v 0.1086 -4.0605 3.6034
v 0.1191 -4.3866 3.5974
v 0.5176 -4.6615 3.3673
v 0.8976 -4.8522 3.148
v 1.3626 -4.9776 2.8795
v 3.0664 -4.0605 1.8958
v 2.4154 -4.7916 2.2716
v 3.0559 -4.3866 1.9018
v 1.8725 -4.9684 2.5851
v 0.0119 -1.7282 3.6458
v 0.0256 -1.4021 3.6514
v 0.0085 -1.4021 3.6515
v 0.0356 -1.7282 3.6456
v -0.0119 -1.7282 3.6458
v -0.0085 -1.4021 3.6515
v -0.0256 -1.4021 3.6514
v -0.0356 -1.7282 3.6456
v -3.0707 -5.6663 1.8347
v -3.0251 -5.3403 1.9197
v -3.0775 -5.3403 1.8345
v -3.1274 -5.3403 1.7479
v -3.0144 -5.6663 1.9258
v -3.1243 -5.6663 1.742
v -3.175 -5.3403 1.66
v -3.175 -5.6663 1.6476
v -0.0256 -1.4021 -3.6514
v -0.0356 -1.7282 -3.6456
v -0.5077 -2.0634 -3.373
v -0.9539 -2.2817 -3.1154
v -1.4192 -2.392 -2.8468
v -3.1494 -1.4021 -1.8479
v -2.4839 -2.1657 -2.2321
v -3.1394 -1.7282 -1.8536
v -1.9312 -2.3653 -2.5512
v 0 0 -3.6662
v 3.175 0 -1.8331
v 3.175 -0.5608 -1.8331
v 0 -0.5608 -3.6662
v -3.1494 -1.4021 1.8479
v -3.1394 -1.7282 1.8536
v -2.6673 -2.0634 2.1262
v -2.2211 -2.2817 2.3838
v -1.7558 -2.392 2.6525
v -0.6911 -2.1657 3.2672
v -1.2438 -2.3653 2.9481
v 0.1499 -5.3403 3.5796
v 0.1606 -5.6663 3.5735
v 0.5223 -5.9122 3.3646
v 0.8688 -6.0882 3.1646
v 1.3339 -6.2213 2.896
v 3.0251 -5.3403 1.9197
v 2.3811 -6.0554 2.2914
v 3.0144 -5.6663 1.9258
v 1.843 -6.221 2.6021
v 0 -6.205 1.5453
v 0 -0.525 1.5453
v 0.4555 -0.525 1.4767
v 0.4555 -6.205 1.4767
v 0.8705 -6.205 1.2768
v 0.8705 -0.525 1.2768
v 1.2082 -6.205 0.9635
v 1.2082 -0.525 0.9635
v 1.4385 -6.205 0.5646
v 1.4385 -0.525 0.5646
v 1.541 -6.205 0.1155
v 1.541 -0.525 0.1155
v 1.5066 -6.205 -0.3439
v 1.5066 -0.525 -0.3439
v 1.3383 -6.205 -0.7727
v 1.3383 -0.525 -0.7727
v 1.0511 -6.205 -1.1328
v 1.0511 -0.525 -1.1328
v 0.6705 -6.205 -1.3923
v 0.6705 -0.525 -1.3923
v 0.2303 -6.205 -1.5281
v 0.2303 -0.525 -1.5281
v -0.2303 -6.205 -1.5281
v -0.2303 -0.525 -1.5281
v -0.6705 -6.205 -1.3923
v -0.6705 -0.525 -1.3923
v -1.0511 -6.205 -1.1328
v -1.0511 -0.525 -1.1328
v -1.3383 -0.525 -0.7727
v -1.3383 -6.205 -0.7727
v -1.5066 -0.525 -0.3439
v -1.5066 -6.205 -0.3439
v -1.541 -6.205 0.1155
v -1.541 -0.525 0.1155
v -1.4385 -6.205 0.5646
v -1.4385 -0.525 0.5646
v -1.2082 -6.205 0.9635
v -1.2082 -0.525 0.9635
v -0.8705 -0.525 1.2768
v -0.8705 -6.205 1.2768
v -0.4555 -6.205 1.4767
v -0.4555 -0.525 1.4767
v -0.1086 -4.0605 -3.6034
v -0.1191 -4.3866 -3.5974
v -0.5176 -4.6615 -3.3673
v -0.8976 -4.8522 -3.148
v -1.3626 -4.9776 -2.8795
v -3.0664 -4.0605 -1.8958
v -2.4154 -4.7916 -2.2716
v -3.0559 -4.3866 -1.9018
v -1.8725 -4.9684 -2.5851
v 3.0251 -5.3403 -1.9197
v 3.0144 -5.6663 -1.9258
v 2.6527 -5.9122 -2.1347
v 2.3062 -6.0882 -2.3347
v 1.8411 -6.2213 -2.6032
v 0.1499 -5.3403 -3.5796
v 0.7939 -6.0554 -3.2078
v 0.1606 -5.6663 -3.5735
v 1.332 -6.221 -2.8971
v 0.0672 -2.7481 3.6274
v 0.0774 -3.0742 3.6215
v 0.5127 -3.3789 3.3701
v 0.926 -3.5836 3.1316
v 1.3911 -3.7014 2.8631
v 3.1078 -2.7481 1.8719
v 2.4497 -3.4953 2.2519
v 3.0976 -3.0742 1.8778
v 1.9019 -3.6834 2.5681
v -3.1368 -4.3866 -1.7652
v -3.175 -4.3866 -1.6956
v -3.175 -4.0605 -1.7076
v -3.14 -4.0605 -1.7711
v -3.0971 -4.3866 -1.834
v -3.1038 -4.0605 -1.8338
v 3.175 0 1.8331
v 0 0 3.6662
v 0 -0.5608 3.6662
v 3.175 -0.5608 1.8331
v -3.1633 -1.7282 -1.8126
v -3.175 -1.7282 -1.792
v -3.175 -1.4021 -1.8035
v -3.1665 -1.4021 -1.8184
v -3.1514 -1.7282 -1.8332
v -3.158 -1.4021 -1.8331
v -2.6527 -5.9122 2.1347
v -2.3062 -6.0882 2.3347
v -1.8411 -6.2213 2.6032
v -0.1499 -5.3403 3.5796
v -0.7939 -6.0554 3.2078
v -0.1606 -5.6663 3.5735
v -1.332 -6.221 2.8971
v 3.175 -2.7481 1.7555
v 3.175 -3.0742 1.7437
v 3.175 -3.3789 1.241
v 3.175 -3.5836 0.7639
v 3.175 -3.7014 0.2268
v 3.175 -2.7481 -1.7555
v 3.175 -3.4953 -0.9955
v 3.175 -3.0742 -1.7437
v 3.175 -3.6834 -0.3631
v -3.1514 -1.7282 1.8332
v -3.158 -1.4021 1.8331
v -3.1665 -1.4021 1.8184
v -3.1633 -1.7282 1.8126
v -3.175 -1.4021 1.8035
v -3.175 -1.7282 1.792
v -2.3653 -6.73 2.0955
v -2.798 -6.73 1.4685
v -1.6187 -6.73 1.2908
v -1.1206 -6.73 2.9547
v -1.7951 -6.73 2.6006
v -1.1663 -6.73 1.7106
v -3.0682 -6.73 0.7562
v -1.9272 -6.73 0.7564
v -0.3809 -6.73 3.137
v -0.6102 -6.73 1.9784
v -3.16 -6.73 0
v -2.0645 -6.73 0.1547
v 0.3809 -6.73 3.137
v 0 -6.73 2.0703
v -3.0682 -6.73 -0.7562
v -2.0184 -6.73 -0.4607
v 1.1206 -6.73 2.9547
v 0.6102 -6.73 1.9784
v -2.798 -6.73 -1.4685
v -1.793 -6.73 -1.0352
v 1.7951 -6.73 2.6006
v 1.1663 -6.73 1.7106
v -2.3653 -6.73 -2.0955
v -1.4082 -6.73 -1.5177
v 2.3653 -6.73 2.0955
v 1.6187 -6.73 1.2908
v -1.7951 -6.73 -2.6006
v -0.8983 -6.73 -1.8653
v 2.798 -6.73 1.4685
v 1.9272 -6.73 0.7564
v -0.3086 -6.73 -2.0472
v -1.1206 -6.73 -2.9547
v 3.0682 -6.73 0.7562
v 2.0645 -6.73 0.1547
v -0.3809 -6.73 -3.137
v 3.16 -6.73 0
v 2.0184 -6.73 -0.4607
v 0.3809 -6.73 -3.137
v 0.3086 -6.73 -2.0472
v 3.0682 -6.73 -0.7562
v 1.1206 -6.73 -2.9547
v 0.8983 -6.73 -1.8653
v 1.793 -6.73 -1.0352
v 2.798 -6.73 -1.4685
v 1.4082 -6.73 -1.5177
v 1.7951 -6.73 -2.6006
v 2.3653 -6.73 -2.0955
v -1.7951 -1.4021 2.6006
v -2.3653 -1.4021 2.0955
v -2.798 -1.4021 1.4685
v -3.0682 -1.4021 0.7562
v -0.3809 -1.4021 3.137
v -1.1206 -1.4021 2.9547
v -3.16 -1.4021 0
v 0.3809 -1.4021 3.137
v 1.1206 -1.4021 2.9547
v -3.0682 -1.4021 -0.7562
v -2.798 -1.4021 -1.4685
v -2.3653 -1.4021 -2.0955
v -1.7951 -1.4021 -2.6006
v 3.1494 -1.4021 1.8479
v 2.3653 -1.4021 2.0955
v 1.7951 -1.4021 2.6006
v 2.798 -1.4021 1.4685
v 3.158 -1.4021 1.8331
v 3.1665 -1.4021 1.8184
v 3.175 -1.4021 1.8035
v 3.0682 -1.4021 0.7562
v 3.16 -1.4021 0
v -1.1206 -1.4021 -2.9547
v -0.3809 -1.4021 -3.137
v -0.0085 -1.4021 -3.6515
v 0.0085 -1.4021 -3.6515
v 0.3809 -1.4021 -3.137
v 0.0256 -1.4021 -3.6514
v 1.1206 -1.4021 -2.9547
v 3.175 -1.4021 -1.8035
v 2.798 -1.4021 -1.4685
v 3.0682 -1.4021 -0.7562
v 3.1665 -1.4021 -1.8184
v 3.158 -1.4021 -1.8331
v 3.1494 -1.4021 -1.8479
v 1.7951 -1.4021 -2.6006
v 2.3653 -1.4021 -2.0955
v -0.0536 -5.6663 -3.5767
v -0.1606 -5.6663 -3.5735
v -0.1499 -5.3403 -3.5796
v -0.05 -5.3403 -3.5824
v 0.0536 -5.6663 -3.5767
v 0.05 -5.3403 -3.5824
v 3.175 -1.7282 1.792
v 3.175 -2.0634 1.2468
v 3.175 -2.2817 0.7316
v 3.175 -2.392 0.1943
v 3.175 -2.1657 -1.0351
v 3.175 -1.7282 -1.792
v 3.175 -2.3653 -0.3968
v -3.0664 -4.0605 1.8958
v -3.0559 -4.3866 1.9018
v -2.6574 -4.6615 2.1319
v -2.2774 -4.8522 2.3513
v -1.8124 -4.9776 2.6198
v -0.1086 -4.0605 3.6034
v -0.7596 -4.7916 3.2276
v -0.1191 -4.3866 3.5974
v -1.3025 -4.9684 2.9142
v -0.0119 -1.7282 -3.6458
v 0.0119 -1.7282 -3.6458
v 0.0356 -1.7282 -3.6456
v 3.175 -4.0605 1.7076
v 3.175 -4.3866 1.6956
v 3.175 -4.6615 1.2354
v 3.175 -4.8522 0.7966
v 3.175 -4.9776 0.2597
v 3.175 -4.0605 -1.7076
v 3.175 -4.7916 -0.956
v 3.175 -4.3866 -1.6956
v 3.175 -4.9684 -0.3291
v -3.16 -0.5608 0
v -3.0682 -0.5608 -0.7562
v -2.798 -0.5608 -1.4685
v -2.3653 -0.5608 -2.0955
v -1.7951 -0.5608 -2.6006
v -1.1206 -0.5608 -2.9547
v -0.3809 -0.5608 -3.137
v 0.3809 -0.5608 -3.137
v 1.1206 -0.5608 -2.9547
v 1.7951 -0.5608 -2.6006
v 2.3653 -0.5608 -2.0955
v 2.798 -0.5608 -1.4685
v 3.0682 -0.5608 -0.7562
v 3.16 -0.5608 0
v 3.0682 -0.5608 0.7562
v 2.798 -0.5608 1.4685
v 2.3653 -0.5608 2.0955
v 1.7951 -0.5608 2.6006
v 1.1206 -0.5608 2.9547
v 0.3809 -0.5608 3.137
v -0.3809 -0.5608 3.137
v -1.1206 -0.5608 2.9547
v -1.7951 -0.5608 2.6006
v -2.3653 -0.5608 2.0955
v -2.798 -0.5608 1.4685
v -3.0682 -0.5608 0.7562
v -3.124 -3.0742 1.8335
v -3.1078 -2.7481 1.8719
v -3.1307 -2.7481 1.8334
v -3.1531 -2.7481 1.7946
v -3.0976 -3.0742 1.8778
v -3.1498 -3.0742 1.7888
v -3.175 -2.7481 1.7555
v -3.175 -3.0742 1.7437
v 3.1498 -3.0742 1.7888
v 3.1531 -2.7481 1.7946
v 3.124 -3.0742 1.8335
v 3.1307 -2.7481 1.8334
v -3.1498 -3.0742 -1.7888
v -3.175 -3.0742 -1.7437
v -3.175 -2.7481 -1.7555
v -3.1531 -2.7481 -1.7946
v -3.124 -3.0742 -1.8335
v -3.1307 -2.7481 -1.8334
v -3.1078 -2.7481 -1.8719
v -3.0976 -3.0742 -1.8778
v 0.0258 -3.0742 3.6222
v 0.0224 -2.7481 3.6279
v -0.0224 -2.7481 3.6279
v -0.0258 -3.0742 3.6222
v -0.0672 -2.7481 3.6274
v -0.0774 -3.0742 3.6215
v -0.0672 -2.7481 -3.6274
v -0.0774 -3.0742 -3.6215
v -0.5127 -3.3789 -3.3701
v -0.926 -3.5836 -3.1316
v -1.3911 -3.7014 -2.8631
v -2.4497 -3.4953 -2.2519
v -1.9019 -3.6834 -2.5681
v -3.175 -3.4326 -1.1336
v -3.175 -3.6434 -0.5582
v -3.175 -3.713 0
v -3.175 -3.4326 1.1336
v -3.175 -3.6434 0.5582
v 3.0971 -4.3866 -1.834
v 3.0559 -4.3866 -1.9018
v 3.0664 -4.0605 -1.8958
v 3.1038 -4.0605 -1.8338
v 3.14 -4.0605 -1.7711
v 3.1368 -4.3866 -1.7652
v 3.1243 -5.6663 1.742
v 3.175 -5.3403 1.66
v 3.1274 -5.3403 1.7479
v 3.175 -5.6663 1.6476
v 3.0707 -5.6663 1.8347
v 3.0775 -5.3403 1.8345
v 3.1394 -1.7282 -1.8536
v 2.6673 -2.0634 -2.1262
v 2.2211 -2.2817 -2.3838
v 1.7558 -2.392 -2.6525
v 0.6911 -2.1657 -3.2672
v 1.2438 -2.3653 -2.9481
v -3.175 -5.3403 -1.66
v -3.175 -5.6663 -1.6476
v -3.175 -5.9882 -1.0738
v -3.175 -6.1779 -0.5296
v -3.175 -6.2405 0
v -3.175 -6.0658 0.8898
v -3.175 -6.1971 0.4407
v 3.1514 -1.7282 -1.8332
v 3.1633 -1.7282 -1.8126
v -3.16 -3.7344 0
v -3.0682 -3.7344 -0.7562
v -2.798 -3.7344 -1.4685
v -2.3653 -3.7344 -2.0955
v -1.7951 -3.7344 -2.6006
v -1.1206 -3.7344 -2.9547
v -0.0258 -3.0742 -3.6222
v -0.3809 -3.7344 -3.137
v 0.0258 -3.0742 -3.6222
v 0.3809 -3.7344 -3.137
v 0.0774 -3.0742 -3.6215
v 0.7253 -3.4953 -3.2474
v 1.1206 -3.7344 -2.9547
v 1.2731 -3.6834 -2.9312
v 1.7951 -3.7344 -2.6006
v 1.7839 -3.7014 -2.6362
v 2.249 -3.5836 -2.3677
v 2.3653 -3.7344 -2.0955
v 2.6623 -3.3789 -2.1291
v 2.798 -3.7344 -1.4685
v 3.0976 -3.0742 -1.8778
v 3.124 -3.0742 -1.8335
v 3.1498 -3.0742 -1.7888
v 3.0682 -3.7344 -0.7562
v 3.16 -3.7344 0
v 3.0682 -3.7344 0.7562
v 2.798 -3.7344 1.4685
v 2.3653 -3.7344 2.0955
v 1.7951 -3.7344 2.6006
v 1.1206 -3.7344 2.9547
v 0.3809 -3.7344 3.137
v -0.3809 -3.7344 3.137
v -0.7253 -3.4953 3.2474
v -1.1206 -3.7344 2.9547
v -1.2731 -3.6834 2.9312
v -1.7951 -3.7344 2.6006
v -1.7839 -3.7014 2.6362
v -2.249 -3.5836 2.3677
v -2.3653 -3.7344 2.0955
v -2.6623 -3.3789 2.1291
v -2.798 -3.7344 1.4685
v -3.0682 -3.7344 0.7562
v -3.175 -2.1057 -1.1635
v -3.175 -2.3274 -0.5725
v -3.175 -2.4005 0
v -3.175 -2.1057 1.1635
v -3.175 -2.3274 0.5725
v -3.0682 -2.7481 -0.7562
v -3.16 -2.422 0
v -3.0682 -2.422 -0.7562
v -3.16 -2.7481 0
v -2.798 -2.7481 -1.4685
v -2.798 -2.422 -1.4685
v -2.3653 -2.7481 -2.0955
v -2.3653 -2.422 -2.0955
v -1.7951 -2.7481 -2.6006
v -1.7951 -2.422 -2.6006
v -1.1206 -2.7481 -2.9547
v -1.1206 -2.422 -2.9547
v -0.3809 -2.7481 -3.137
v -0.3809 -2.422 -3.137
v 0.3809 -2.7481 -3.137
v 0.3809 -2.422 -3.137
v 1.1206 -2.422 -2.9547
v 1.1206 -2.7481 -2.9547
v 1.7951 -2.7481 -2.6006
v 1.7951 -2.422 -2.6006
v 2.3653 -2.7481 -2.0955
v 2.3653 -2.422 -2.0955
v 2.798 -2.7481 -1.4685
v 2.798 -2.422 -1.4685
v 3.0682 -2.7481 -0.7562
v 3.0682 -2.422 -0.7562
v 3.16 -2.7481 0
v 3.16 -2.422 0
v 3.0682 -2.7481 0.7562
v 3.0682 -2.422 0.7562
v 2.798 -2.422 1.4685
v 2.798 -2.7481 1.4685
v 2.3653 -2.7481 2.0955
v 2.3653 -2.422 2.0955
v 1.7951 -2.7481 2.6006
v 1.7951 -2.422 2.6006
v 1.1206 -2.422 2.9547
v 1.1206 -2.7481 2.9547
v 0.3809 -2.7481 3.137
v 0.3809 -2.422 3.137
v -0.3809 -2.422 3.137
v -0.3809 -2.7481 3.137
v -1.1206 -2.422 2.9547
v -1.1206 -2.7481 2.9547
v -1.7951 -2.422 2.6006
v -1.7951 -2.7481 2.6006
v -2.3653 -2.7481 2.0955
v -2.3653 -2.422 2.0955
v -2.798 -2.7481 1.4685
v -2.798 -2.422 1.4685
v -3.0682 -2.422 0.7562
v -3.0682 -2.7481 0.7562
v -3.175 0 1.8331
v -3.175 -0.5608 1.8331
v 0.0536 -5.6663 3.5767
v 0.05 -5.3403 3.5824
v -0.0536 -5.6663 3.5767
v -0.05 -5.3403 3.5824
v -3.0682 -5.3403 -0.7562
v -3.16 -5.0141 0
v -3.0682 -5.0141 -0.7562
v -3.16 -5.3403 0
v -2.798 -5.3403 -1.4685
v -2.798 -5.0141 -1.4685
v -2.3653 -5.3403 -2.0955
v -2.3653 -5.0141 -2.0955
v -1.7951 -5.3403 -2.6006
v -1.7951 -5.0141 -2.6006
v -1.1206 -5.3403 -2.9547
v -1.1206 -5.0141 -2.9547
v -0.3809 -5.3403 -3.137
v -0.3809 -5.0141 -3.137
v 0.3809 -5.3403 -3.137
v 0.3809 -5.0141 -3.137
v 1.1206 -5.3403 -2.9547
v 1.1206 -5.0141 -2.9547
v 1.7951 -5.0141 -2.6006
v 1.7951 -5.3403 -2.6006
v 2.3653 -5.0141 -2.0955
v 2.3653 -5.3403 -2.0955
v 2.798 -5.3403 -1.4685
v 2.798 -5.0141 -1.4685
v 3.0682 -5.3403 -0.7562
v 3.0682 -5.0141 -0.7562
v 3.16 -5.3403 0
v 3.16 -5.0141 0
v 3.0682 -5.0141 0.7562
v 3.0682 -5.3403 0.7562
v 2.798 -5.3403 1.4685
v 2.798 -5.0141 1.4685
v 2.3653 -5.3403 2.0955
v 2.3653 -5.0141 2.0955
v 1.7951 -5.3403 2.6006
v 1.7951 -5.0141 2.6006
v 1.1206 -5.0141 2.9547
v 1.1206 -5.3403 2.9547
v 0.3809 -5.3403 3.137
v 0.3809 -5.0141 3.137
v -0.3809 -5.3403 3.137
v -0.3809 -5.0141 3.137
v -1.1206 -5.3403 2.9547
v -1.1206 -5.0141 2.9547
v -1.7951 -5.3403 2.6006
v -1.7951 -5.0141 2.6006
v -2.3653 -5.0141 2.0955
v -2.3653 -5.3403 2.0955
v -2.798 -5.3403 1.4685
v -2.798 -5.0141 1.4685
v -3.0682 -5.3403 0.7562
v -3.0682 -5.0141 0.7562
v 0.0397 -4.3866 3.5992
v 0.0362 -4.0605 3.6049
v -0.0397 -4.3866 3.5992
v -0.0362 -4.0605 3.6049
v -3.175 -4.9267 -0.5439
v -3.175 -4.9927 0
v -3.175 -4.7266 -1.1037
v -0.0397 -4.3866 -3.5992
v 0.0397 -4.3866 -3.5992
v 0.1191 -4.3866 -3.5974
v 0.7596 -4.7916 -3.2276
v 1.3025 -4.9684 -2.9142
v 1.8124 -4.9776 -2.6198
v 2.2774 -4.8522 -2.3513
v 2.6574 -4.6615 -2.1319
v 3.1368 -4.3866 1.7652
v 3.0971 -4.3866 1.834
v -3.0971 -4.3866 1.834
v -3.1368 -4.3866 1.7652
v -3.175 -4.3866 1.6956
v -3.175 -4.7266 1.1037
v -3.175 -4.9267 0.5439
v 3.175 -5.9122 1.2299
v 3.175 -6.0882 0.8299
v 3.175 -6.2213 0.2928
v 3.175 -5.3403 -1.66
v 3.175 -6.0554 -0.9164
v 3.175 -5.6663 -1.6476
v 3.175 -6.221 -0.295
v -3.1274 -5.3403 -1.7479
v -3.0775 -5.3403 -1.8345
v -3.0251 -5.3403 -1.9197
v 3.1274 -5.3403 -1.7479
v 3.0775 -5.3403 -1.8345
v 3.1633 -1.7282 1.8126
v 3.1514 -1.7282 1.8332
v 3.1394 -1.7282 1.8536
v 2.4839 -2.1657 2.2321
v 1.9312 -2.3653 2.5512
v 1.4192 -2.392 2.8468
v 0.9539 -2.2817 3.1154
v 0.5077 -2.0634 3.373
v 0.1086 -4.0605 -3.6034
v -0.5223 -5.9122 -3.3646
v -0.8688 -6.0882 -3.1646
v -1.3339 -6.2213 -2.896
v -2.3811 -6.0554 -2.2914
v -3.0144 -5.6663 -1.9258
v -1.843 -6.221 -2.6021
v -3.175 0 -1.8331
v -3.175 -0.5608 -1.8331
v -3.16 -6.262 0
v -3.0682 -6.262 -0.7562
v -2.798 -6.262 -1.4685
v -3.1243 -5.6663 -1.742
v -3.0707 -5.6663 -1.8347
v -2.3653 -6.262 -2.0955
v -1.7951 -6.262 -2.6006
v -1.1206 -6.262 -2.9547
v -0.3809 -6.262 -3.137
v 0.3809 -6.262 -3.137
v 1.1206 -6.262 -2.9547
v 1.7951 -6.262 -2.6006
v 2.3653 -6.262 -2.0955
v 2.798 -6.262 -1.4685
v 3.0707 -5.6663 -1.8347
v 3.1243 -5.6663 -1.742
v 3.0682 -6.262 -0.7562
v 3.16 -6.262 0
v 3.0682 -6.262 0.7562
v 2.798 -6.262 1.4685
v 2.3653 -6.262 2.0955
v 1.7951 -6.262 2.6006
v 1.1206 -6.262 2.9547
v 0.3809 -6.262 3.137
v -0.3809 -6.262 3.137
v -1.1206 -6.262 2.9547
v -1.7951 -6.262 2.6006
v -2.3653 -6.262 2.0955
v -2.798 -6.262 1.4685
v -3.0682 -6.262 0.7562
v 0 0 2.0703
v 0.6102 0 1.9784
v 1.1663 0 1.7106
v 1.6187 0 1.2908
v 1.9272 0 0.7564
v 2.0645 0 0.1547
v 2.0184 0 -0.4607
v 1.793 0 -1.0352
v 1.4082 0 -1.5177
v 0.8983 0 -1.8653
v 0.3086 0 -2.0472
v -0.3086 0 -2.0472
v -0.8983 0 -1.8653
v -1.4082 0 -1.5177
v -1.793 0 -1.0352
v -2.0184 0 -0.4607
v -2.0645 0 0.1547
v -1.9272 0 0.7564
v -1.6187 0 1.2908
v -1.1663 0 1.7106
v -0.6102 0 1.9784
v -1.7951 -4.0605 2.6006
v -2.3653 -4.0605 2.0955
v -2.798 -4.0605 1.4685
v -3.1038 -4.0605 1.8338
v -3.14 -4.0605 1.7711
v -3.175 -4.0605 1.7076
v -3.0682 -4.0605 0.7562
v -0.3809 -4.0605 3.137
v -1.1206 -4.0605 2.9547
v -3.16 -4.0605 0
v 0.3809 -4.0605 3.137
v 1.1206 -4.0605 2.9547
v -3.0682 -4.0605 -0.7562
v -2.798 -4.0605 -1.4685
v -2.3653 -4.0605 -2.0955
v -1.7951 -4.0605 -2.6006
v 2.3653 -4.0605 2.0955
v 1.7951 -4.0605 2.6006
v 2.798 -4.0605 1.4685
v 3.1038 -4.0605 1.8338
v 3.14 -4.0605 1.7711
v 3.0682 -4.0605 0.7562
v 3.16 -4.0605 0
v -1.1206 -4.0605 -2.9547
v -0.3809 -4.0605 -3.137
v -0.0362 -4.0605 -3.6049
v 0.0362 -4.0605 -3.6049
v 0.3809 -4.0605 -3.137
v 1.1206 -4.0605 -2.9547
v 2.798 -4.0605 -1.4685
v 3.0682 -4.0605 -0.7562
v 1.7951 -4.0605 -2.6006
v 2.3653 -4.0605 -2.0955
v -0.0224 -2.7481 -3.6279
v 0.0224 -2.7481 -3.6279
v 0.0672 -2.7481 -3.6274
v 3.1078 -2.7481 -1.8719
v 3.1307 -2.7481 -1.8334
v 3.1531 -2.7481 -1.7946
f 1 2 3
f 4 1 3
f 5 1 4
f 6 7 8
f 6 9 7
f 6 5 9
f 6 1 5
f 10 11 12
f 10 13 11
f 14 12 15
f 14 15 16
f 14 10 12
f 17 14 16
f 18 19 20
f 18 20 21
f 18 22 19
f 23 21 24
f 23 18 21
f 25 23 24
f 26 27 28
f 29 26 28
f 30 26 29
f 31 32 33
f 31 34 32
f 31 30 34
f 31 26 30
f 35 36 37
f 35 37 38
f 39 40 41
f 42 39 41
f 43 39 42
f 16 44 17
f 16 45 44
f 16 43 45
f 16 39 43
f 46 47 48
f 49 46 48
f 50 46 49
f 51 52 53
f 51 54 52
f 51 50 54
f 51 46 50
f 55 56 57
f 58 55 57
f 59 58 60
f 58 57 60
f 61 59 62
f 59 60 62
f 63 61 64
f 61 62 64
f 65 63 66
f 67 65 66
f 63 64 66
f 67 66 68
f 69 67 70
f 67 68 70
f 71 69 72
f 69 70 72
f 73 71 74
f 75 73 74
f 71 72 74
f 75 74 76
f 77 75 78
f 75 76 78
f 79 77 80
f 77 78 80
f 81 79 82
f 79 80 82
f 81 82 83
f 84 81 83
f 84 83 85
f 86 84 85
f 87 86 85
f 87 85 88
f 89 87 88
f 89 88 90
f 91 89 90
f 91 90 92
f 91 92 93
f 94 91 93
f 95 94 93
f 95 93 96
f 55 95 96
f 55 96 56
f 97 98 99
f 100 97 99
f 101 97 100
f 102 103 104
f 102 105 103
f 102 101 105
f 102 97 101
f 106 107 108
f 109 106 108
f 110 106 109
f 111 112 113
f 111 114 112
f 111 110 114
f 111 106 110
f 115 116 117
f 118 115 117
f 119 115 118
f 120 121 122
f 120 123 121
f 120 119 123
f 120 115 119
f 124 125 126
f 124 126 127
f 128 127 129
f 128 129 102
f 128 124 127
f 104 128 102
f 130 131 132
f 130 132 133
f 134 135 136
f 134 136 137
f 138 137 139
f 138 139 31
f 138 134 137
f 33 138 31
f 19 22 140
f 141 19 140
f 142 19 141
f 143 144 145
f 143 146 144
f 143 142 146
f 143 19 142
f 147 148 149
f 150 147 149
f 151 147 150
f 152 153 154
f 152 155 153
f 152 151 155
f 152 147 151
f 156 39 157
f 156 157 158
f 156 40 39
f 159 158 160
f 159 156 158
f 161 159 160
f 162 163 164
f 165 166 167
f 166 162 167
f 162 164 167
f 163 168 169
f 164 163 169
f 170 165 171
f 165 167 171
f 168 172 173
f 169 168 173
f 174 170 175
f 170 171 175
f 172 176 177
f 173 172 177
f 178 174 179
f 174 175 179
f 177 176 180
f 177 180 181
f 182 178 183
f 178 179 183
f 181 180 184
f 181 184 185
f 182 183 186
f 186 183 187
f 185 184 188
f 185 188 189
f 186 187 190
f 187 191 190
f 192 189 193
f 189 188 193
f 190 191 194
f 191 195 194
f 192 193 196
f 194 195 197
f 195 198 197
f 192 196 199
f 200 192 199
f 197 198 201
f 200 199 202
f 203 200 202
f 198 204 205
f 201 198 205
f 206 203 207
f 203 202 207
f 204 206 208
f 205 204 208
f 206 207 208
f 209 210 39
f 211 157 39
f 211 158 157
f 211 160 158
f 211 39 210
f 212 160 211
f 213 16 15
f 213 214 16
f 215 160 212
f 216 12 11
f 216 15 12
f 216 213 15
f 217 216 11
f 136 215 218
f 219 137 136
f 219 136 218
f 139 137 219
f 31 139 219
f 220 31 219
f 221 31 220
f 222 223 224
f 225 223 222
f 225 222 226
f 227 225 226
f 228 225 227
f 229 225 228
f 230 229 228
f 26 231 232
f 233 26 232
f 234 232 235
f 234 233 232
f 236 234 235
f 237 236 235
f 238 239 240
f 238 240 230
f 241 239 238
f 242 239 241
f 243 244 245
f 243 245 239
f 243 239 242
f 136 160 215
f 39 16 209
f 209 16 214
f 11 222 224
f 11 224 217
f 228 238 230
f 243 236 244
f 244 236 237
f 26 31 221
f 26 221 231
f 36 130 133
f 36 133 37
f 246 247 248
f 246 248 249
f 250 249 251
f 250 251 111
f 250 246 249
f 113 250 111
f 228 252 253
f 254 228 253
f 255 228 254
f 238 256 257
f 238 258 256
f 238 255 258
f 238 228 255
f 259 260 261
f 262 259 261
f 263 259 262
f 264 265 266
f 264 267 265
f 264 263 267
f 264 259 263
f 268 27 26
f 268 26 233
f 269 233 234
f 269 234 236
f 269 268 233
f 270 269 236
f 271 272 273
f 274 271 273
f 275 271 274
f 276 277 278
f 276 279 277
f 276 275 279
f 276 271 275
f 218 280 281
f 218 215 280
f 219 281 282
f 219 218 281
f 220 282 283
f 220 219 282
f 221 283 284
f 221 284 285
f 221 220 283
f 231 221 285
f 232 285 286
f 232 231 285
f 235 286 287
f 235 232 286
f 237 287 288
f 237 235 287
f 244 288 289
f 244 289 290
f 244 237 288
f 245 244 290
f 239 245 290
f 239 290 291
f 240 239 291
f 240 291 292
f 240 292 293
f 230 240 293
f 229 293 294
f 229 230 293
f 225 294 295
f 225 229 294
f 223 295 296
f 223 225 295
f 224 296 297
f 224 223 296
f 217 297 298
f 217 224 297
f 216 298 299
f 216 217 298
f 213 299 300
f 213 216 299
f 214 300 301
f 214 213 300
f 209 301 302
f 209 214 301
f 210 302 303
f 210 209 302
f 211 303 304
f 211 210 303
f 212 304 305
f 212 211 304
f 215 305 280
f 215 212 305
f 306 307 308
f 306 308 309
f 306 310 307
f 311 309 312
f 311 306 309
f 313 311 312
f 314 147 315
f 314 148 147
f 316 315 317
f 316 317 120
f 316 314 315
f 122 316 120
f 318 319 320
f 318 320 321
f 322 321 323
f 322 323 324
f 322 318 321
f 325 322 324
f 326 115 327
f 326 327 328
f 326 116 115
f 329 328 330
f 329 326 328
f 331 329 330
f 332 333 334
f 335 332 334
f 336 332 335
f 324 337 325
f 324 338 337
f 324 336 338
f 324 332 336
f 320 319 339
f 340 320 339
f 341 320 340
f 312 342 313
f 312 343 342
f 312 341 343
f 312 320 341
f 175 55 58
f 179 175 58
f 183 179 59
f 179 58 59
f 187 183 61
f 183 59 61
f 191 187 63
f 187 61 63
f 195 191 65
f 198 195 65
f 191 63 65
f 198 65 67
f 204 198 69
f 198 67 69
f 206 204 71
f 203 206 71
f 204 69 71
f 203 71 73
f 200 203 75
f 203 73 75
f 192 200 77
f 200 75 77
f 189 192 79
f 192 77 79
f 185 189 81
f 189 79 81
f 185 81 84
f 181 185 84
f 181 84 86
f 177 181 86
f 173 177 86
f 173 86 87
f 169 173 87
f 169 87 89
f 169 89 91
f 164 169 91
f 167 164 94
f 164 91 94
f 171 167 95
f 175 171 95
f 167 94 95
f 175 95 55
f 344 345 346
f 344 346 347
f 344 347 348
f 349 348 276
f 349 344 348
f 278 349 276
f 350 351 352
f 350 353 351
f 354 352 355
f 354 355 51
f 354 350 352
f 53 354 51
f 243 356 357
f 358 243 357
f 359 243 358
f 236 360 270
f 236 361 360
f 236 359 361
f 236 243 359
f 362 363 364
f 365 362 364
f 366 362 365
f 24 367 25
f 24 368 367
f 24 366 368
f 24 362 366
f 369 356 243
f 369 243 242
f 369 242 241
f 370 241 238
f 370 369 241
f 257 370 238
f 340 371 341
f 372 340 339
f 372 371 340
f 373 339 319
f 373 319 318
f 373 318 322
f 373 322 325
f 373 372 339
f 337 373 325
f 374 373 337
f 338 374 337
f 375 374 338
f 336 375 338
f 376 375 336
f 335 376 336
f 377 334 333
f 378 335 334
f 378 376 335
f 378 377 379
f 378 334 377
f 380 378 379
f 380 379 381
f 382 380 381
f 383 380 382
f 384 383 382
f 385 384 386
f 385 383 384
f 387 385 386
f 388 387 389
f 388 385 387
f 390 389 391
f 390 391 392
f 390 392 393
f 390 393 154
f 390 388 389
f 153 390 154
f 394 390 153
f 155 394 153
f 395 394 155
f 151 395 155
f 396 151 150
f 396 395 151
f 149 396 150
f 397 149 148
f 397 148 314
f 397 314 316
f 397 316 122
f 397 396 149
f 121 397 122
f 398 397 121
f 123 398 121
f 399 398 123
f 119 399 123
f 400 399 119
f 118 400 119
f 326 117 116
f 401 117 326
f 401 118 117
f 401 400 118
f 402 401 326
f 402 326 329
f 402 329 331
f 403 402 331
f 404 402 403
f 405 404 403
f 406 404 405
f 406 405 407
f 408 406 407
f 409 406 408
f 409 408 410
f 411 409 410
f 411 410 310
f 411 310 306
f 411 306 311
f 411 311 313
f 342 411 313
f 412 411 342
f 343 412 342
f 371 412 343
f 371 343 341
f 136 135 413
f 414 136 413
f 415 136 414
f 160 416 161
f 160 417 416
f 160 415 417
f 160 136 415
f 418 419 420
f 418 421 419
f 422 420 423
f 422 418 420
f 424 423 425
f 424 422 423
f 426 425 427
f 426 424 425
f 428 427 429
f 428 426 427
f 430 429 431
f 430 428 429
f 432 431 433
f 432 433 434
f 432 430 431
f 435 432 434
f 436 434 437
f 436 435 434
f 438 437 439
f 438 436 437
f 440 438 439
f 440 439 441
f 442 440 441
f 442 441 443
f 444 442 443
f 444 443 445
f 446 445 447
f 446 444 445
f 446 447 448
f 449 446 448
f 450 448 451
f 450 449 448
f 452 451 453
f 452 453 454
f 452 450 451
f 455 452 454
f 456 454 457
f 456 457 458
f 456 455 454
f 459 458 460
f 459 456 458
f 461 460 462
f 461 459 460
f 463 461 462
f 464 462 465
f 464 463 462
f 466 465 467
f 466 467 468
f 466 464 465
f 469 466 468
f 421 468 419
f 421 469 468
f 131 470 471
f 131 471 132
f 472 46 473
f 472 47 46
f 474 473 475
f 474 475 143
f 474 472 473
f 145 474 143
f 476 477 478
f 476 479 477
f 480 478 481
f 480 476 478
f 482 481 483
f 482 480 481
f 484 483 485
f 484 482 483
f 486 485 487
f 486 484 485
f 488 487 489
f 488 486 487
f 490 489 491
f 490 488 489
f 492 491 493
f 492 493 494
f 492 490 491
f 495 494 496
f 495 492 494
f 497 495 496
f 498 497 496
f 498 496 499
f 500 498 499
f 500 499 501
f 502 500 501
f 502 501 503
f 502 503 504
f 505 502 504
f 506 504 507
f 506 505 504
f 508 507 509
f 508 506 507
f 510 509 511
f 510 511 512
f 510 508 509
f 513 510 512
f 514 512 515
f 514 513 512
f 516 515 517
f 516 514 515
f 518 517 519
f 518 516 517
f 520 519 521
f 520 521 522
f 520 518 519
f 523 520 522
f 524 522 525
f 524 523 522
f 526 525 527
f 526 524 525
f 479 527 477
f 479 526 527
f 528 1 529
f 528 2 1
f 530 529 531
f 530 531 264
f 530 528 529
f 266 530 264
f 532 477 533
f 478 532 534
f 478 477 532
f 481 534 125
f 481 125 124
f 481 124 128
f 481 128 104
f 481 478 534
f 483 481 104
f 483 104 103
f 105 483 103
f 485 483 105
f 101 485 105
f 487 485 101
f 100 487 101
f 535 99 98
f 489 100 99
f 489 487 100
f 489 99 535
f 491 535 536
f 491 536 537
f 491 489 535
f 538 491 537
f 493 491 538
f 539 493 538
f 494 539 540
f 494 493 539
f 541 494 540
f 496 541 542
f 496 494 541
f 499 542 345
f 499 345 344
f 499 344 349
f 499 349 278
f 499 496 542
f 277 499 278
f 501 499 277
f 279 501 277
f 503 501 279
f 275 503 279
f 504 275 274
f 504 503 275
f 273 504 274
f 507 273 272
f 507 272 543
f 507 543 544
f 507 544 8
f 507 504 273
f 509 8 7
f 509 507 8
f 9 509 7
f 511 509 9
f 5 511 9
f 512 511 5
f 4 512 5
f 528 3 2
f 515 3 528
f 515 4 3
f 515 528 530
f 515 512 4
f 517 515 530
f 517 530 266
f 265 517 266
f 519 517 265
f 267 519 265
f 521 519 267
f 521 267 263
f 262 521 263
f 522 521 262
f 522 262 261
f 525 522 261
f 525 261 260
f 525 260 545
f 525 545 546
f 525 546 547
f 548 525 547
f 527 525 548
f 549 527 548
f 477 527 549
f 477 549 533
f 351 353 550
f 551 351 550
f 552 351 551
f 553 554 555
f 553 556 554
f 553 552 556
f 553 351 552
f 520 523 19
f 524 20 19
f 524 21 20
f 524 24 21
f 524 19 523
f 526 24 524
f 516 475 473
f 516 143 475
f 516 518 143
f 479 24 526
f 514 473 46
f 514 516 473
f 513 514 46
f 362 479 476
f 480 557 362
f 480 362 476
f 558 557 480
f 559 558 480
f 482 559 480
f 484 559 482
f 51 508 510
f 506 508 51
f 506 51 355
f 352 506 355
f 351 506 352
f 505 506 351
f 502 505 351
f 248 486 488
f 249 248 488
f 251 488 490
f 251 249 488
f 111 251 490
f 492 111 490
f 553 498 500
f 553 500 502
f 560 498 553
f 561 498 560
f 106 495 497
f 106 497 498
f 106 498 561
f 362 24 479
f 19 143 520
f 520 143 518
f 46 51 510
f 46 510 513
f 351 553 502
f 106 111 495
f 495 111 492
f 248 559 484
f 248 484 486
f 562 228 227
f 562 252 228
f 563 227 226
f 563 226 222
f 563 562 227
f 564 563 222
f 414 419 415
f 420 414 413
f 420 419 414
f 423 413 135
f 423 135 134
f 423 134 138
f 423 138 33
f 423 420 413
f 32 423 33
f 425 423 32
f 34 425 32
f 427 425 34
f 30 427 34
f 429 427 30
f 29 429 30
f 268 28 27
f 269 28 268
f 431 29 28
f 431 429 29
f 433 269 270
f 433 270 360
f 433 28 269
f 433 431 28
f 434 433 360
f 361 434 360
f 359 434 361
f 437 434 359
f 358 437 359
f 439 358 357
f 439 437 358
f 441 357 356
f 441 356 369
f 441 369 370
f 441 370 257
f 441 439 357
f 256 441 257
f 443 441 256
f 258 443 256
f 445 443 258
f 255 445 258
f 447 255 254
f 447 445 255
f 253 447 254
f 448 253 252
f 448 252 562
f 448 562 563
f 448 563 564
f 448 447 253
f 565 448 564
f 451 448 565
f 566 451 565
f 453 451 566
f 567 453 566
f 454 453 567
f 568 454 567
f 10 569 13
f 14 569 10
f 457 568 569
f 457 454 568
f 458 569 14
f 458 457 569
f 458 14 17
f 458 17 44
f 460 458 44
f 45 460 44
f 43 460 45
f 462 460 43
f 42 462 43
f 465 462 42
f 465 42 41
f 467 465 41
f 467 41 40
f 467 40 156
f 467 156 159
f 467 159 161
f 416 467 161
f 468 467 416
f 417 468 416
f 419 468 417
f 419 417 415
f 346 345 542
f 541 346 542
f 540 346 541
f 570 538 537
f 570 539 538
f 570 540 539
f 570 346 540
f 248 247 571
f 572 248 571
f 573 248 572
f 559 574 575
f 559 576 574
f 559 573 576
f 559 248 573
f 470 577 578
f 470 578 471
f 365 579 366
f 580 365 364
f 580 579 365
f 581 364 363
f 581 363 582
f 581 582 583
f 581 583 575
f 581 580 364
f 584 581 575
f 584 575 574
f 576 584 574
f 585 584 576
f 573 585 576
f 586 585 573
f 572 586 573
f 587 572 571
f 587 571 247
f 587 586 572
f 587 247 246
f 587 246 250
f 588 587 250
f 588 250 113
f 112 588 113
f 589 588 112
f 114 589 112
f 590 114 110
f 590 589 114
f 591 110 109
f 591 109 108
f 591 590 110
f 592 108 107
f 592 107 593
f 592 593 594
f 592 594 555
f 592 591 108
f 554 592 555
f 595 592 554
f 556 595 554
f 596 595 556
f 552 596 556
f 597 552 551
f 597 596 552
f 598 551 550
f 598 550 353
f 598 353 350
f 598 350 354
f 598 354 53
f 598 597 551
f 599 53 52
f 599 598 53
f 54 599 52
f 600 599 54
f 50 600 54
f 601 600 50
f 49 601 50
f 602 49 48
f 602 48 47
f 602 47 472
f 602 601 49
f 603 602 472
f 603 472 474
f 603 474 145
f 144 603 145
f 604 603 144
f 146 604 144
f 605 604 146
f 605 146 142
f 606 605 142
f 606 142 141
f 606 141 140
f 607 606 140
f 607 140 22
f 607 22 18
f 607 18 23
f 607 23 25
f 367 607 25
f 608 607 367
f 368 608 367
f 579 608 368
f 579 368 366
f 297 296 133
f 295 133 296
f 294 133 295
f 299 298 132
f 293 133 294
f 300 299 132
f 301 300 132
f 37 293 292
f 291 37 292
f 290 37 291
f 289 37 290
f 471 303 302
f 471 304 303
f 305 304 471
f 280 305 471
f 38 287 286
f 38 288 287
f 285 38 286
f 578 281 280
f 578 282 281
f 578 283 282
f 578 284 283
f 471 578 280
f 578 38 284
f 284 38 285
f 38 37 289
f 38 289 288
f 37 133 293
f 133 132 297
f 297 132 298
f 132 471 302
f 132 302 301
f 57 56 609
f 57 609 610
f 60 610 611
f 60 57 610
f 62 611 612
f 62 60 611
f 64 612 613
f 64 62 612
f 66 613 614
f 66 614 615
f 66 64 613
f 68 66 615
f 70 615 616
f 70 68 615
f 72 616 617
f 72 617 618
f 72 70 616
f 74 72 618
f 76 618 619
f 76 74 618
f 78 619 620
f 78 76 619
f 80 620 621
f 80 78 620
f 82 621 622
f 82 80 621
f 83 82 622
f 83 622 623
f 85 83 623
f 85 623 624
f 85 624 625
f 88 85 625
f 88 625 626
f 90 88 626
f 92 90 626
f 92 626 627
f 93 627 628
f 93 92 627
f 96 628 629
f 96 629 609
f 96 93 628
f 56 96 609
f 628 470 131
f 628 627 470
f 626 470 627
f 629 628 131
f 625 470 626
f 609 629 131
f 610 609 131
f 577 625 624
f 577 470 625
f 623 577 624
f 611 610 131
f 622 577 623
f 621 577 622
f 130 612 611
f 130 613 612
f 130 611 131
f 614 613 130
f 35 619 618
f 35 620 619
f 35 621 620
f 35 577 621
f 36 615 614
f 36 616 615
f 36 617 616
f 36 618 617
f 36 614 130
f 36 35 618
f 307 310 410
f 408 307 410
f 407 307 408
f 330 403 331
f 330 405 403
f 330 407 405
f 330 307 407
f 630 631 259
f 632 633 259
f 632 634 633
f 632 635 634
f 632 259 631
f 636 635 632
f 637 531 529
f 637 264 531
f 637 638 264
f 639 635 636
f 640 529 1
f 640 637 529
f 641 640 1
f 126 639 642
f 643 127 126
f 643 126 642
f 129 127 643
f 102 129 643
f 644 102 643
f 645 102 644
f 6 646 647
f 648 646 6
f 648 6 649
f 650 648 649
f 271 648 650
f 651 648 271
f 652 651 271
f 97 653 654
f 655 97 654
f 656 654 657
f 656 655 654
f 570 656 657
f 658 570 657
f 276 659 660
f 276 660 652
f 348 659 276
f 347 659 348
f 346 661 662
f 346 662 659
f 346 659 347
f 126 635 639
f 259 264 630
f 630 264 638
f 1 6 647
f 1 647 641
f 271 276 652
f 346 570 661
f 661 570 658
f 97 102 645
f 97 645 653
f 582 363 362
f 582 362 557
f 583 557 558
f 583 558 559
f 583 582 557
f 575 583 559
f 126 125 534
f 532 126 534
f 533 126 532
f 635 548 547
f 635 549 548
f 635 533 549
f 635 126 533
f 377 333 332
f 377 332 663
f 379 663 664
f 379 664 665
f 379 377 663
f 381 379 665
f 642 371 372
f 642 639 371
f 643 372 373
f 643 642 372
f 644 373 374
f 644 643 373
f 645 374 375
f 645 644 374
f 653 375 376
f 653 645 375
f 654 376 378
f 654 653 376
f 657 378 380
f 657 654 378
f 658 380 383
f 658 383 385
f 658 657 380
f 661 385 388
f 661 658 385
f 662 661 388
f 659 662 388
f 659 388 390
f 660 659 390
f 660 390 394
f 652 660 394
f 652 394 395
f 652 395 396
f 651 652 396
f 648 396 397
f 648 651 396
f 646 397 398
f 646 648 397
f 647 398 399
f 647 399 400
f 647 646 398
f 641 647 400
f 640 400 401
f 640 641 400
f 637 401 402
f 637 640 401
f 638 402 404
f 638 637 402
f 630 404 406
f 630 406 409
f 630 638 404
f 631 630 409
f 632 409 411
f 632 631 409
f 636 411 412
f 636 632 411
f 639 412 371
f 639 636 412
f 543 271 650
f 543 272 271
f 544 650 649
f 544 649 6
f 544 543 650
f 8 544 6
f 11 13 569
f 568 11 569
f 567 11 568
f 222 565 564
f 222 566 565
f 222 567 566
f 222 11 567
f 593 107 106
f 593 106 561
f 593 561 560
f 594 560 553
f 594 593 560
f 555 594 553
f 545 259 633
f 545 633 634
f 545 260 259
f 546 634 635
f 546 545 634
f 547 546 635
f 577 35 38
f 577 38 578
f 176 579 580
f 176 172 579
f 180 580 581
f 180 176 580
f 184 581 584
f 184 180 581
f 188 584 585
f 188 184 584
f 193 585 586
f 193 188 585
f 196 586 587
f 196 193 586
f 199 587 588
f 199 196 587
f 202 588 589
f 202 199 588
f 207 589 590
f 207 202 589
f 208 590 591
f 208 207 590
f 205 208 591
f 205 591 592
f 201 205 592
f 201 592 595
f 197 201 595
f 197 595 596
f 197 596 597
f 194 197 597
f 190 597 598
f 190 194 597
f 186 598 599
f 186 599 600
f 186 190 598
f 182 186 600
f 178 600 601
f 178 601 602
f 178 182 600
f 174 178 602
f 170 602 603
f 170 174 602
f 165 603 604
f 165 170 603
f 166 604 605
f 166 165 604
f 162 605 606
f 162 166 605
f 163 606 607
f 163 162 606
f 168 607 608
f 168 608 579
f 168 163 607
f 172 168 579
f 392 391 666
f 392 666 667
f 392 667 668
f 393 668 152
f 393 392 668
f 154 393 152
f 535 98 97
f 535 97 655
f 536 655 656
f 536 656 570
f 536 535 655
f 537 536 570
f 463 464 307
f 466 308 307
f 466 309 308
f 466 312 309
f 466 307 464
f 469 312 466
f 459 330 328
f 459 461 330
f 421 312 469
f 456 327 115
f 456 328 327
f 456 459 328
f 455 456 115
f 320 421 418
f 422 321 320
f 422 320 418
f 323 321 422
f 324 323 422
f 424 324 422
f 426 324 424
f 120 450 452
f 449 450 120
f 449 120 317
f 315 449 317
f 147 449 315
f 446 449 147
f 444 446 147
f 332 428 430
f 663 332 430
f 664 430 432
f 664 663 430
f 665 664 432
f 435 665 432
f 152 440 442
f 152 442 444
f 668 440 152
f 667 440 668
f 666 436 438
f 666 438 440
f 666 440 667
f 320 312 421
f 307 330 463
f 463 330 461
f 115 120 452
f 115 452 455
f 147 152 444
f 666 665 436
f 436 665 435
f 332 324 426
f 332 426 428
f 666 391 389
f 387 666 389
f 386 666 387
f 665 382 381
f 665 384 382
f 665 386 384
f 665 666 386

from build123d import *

# Parameters (mm, degrees)
EXTRUDE1_DEPTH = 6.73
SKETCH4_R      = 1.545336663
EXTRUDE2_DEPTH = 9.295442022
CHAMFER1_SIZE  = 0.525


with BuildPart() as part:
    # Sketch1 → Extrude1 (new body)
    with BuildSketch(Plane(origin=(0, 0, 0), x_dir=(1, 0, 0), z_dir=(0, 1, 0))):
        Polygon((0, 3.666174209), (-3.175, 1.833087105), (-3.175, -1.833087105), (0, -3.666174209), (3.175, -1.833087105), (3.175, 1.833087105), align=None)
    extrude(amount=-EXTRUDE1_DEPTH)

    # Sketch4 → Extrude2 (cut, through all)
    with BuildSketch(Plane(origin=(0, 0, 0), x_dir=(-1, 0, 0), z_dir=(0, 1, 0))):
        Circle(SKETCH4_R)
    extrude(amount=-EXTRUDE2_DEPTH, mode=Mode.SUBTRACT)

    # Chamfer1
    chamfer1_edges = [part.edges().sort_by_distance(p)[0] for p in [
        (1.545336663, 0, 0),
        (1.545336663, -6.73, 0),
    ]]
    chamfer(chamfer1_edges, length=CHAMFER1_SIZE)

    # Sketch5 → Cut-Revolve1 (revolve, cut)
    with BuildSketch(Plane.XY):
        Polygon((-3.16, -6.73), (-3.666174209, -6.73), (-4.172348419, -6.73), (-4.172348419, 0), (-3.666174209, 0), (-3.666174209, -0.560833333), (-3.16, -0.560833333), (-3.16, -1.402083333), (-3.651490136, -1.402083333), (-3.645798403, -1.728162487), (-3.16, -2.421954508), (-3.16, -2.748083333), (-3.627995619, -2.748083333), (-3.622303886, -3.074162487), (-3.16, -3.73440086), (-3.16, -4.060529685), (-3.605086782, -4.060529685), (-3.59939505, -4.386608839), (-3.16, -5.014130003), (-3.16, -5.340258828), (-3.582749027, -5.340258828), (-3.577057294, -5.666337982), (-3.16, -6.261957525), align=None)
    revolve(axis=Axis((0, 0, 0), (0, -1, 0)), mode=Mode.SUBTRACT)


solid = part.part
